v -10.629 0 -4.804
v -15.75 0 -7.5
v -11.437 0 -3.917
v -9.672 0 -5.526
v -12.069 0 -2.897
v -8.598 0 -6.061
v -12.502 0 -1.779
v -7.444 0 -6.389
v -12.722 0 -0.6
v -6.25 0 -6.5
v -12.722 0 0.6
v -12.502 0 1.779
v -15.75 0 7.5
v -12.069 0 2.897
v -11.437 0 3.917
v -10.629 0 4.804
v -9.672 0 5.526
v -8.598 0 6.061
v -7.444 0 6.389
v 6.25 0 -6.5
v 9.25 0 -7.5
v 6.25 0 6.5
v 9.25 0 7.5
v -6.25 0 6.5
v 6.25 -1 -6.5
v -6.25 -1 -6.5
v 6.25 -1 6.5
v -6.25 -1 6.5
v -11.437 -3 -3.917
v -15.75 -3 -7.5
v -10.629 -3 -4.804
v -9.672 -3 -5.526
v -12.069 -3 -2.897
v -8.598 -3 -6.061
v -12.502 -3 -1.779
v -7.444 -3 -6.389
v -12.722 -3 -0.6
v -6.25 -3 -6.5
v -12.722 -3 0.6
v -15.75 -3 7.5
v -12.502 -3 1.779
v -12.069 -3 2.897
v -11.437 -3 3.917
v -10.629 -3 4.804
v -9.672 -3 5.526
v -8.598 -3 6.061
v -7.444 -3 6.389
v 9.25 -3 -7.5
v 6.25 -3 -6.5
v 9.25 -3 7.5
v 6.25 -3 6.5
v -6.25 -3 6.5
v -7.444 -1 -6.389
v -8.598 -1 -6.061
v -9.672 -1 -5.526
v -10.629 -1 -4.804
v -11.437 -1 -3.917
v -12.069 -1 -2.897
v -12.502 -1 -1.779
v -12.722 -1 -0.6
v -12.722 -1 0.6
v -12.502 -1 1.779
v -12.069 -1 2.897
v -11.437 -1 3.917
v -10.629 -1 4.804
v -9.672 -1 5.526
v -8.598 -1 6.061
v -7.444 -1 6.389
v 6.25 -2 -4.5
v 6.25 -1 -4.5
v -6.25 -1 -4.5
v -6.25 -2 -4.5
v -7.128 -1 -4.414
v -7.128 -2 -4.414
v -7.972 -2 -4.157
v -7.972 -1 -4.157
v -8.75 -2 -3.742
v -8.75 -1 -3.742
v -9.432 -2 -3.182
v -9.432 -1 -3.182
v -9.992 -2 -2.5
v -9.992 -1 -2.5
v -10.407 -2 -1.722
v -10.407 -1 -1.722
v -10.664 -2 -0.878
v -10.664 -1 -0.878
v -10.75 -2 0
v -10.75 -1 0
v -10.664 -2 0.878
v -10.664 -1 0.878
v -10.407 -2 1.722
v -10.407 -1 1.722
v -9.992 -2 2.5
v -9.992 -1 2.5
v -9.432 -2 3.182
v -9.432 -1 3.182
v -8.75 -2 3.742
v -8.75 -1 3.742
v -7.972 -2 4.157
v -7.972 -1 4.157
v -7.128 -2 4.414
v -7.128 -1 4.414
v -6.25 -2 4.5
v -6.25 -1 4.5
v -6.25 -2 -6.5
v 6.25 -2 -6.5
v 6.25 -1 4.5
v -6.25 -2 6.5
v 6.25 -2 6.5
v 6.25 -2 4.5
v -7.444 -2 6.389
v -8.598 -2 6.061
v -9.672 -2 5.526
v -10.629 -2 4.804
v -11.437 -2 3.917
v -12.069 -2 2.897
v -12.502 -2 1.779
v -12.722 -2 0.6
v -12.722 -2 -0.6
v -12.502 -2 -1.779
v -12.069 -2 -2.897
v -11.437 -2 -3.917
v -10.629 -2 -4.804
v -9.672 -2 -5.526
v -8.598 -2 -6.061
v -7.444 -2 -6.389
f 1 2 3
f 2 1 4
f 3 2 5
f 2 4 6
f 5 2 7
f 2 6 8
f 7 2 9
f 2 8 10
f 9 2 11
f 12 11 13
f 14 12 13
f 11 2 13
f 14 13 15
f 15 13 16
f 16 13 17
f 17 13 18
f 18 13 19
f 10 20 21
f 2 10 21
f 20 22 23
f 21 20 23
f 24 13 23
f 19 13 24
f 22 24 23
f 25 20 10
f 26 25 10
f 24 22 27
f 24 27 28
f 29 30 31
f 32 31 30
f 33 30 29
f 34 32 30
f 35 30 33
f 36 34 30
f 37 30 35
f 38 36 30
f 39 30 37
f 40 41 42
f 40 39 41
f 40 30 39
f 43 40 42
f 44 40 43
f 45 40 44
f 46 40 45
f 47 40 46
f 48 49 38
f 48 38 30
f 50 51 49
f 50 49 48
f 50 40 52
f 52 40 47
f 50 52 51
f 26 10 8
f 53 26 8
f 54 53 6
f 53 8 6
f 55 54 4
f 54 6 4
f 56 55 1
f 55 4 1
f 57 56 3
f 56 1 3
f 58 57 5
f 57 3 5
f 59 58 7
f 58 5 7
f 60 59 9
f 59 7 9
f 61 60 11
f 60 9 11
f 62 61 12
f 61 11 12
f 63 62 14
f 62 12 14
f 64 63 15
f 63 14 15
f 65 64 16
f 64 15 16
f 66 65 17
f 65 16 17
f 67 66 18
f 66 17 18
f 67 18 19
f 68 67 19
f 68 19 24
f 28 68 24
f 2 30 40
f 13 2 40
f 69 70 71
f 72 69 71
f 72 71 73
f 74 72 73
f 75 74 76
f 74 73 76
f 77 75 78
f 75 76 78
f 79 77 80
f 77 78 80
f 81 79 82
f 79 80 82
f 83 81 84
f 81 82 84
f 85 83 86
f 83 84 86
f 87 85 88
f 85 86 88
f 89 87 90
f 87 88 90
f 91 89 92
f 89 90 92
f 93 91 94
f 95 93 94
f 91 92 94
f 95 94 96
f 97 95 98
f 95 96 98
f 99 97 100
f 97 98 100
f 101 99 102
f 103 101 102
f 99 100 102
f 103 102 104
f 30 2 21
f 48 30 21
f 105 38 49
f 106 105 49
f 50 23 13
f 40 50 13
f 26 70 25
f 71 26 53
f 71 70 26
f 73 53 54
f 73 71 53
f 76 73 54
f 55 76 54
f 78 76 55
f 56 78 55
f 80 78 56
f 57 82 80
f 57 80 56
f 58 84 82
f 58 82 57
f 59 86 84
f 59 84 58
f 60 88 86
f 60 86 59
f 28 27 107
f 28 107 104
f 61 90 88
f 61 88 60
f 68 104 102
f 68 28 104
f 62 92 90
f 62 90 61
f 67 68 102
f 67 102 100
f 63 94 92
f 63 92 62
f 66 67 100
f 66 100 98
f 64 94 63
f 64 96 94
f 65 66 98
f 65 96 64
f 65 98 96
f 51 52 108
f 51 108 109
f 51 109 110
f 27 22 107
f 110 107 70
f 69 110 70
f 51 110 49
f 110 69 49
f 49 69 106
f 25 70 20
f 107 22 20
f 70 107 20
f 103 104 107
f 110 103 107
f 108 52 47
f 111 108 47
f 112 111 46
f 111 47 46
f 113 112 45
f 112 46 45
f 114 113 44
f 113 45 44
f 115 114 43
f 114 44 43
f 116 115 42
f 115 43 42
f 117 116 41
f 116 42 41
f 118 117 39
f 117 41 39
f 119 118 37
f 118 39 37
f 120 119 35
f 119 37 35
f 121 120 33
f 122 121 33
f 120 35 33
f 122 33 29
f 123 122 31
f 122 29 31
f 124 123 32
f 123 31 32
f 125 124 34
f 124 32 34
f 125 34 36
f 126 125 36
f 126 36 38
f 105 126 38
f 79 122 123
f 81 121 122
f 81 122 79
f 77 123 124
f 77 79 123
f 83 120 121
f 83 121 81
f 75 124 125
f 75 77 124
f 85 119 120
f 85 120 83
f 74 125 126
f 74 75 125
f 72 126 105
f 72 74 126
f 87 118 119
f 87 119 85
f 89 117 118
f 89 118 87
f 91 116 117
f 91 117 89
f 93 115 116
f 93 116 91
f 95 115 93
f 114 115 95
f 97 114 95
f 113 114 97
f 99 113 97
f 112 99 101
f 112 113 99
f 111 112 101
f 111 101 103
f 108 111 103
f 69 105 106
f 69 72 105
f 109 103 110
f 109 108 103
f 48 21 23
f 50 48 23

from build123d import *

# Parameters (mm, degrees)
F1_DEPTH = 3
F2_W     = 12.5
F2_H     = 13
F3_DEPTH = 1
F4_W     = 12.5
F4_H     = 13
F5_DEPTH = 1
F6_W     = 3.383816
F6_H     = 15
F7_DEPTH = 25


with BuildPart() as f1:
    # F0 (on Front) → F1 (new body)
    with BuildSketch(Plane.XZ):
        Polygon((9.25, -7.5), (9.25, 7.5), (-13.75, 7.5), (-19.133816, 7.5), (-19.133816, -7.5), (-13.75, -7.5), align=None)
        with BuildLine():
            Line((-6.25, 4.5), (6.25, 4.5))
            Line((6.25, 4.5), (6.25, -4.5))
            Line((6.25, -4.5), (-6.25, -4.5))
            ThreePointArc((-6.25, -4.5), (-10.75, 0), (-6.25, 4.5))
        make_face(mode=Mode.SUBTRACT)
    extrude(amount=F1_DEPTH)

    # F2 (on face) → F3 (cut)
    with BuildSketch(Plane.XZ.offset(3)):
        Rectangle(F2_W, F2_H)
        with BuildLine():
            Line((-6.25, -6.5), (-6.25, 6.5))
            ThreePointArc((-6.25, 6.5), (-12.75, 0), (-6.25, -6.5))
        make_face()
    extrude(amount=-F3_DEPTH, mode=Mode.SUBTRACT)

    # F4 (on face) → F5 (cut)
    with BuildSketch(Plane(origin=(0, 0, 0), x_dir=(-1, 0, 0), z_dir=(0, 1, 0))):
        Rectangle(F4_W, F4_H)
        with BuildLine():
            ThreePointArc((6.25, -6.5), (12.75, 0), (6.25, 6.5))
            Line((6.25, 6.5), (6.25, -6.5))
        make_face()
    extrude(amount=-F5_DEPTH, mode=Mode.SUBTRACT)

    # F6 (on face) → F7 (cut)
    with BuildSketch(Plane.XZ.offset(3)):
        with Locations((-17.441908, 0)):
            Rectangle(F6_W, F6_H)
    extrude(amount=-F7_DEPTH, mode=Mode.SUBTRACT)


solid = f1.part
